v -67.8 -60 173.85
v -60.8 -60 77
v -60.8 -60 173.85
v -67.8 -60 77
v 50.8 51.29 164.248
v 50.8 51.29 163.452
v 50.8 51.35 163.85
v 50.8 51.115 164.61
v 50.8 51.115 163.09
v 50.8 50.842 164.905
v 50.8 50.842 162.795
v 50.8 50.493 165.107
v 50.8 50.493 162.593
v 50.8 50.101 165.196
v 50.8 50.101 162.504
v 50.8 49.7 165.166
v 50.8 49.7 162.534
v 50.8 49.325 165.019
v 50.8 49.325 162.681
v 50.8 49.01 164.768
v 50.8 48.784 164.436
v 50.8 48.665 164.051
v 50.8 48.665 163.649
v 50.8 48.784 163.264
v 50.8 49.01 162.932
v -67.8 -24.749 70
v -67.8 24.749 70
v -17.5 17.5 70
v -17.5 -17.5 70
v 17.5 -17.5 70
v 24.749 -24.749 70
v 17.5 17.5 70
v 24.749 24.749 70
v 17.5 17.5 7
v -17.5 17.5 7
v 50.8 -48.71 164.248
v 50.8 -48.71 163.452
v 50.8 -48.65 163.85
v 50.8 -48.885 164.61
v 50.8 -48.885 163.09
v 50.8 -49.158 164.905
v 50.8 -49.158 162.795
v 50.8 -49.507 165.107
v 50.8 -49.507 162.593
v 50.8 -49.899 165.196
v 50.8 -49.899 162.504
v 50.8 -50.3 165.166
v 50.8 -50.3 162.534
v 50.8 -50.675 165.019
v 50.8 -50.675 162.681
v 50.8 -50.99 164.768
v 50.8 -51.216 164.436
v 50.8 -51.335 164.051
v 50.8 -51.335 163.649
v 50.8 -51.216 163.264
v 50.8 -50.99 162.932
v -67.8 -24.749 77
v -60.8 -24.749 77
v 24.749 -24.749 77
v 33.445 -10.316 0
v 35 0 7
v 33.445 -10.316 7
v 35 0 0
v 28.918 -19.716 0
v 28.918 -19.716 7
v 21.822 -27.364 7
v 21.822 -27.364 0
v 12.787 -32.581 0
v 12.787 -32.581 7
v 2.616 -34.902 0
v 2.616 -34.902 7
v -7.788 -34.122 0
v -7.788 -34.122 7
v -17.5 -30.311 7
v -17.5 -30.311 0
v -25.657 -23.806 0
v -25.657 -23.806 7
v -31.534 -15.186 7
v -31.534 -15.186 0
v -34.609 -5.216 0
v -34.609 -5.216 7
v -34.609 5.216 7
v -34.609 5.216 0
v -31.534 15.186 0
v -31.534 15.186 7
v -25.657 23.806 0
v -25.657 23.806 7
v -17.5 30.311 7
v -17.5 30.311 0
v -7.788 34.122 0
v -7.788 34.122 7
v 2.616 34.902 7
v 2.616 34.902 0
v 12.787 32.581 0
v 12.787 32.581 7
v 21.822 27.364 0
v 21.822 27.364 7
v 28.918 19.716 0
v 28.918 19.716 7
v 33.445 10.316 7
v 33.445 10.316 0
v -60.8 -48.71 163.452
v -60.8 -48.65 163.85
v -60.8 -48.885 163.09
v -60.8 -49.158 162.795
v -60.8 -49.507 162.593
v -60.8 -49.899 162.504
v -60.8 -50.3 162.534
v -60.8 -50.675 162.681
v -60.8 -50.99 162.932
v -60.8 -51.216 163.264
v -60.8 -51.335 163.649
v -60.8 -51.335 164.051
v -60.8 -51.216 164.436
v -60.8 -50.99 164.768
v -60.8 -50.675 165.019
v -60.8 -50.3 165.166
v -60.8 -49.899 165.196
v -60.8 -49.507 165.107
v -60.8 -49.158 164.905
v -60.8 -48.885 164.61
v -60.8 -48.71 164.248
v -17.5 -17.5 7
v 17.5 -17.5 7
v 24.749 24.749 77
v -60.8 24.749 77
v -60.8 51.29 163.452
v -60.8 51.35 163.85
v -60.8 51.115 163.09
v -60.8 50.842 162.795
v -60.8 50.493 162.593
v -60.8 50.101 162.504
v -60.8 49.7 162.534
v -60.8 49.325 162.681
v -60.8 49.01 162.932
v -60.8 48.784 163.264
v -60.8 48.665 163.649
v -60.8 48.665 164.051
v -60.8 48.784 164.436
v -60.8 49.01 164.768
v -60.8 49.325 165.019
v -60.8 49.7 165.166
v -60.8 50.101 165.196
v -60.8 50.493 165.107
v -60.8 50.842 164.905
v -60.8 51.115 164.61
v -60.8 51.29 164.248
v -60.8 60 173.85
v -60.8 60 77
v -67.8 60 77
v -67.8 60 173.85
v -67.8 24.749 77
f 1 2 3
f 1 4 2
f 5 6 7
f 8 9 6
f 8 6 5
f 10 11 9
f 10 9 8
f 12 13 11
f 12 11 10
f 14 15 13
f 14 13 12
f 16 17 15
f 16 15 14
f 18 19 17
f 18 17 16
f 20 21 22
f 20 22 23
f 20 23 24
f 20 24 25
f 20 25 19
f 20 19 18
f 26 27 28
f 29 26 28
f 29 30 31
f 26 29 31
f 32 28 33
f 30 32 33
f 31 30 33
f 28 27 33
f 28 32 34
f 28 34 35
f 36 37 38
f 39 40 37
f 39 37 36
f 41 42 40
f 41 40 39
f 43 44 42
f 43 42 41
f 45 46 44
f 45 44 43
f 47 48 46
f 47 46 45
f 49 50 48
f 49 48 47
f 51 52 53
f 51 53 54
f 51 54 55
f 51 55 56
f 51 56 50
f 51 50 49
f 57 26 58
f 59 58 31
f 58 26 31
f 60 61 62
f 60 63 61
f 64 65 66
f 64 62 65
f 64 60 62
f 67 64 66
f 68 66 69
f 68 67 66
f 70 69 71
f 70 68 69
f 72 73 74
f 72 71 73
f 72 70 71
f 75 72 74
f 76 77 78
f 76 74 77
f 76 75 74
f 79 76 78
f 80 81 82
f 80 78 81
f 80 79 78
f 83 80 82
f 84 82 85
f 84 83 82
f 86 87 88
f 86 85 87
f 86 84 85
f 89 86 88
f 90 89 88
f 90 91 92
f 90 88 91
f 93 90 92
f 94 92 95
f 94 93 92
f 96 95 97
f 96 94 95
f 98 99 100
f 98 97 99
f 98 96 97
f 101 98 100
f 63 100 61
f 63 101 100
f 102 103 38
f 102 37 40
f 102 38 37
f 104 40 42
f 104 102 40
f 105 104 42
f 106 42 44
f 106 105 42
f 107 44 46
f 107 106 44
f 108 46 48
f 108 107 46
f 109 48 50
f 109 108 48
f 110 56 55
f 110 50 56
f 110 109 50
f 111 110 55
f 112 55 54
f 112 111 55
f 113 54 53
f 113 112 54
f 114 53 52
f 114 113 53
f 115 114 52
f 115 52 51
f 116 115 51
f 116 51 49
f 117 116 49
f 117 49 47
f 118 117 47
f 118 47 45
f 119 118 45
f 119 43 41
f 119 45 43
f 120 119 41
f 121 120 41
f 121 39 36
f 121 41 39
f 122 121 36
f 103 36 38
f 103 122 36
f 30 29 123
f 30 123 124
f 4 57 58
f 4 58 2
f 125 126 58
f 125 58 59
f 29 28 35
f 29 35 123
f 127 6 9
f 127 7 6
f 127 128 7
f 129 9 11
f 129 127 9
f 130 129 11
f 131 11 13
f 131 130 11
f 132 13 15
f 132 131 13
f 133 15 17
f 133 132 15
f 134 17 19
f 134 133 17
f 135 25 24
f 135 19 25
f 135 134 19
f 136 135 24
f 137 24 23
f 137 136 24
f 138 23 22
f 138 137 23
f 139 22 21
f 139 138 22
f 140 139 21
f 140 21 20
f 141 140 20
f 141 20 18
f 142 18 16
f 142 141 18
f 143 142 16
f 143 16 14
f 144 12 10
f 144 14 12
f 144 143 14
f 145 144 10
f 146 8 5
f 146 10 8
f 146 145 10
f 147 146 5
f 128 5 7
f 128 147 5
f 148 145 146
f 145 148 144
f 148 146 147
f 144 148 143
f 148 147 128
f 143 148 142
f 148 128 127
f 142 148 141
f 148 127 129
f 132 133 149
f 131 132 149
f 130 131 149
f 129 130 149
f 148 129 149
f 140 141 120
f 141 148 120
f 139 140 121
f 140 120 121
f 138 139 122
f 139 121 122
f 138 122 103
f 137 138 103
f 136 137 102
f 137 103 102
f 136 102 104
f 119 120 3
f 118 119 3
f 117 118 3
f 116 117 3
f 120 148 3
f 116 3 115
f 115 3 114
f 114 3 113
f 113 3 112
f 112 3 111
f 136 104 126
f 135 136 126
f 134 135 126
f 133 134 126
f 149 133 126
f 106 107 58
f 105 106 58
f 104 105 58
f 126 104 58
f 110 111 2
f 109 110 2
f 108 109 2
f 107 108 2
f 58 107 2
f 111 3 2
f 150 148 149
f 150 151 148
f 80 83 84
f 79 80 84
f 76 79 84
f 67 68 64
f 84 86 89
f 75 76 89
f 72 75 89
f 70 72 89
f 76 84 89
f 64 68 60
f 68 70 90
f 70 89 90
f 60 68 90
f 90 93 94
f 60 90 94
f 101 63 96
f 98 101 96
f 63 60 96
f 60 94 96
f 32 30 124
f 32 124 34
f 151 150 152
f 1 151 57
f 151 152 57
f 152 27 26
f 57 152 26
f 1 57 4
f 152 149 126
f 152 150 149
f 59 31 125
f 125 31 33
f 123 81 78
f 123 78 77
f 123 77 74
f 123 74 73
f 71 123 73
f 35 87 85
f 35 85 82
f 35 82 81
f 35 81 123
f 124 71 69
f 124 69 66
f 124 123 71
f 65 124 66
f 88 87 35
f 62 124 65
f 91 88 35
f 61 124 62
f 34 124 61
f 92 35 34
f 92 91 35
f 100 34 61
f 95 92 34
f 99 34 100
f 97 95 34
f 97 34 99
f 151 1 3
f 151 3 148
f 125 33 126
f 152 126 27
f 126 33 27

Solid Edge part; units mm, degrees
sketch "Sketch1" plane through (0, 0, 0) normal (0, 0, 1) x (1, 0, 0)
  circle A0 centre (0, 0) radius 35
  dimension "D1" = 70
extrude "Protrusion1" add sketch "Sketch1" along normal blind 7
sketch "Sketch2" plane through (0, 0, 7) normal (0, 0, 1) x (1, 0, 0)
  line L0 (-17.5, -17.5) -> (17.5, -17.5)
  line L1 (17.5, -17.5) -> (17.5, 17.5)
  line L2 (17.5, 17.5) -> (-17.5, 17.5)
  line L3 (-17.5, 17.5) -> (-17.5, -17.5)
  dimension "D1" = 35
extrude "ExtrudedProtrusion_2" add sketch "Sketch2" along normal blind 63
sketch "Sketch3" plane through (0, 0, 70) normal (0, 0, 1) x (1, 0, 0)
  line L0 (-67.8, -24.7487) -> (24.7487, -24.7487)
  line L1 (24.7487, -24.7487) -> (24.7487, 24.7487)
  line L2 (24.7487, 24.7487) -> (-67.8, 24.7487)
  line L3 (-67.8, 24.7487) -> (-67.8, -24.7487)
  dimension "D1" = 49.4975
  dimension "D2" = 24.7487
  dimension "D3" = 67.8
extrude "ExtrudedProtrusion_3" add sketch "Sketch3" along normal blind 7
sketch "Sketch4" plane through (-67.8, 0, 73.5) normal (-1, 0, 0) x (0, -1, 0)
  line L0 (-60, 3.5) -> (60, 3.5)
  line L1 (60, 3.5) -> (60, 100.35)
  line L2 (60, 100.35) -> (-60, 100.35)
  line L3 (-60, 100.35) -> (-60, 3.5)
  dimension "D1" = 120
  dimension "D2" = 2.7
  dimension "D3" = 10
  dimension "D4" = 163.85
  dimension "D5" = 100
extrude "ExtrudedProtrusion_4" add sketch "Sketch4" against normal blind 7
sketch "Sketch5" plane through (-60.8, 0, 125.425) normal (1, 0, 0) x (0, 1, 0)
  circle A0 centre (-50, 38.425) radius 1.35
  circle A1 centre (50, 38.425) radius 1.35
  dimension "D1" = 2.7
  dimension "D2" = 100
  dimension "D3" = 163.85
extrude "ExtrudedProtrusion_5" add sketch "Sketch5" along normal blind 111.6
